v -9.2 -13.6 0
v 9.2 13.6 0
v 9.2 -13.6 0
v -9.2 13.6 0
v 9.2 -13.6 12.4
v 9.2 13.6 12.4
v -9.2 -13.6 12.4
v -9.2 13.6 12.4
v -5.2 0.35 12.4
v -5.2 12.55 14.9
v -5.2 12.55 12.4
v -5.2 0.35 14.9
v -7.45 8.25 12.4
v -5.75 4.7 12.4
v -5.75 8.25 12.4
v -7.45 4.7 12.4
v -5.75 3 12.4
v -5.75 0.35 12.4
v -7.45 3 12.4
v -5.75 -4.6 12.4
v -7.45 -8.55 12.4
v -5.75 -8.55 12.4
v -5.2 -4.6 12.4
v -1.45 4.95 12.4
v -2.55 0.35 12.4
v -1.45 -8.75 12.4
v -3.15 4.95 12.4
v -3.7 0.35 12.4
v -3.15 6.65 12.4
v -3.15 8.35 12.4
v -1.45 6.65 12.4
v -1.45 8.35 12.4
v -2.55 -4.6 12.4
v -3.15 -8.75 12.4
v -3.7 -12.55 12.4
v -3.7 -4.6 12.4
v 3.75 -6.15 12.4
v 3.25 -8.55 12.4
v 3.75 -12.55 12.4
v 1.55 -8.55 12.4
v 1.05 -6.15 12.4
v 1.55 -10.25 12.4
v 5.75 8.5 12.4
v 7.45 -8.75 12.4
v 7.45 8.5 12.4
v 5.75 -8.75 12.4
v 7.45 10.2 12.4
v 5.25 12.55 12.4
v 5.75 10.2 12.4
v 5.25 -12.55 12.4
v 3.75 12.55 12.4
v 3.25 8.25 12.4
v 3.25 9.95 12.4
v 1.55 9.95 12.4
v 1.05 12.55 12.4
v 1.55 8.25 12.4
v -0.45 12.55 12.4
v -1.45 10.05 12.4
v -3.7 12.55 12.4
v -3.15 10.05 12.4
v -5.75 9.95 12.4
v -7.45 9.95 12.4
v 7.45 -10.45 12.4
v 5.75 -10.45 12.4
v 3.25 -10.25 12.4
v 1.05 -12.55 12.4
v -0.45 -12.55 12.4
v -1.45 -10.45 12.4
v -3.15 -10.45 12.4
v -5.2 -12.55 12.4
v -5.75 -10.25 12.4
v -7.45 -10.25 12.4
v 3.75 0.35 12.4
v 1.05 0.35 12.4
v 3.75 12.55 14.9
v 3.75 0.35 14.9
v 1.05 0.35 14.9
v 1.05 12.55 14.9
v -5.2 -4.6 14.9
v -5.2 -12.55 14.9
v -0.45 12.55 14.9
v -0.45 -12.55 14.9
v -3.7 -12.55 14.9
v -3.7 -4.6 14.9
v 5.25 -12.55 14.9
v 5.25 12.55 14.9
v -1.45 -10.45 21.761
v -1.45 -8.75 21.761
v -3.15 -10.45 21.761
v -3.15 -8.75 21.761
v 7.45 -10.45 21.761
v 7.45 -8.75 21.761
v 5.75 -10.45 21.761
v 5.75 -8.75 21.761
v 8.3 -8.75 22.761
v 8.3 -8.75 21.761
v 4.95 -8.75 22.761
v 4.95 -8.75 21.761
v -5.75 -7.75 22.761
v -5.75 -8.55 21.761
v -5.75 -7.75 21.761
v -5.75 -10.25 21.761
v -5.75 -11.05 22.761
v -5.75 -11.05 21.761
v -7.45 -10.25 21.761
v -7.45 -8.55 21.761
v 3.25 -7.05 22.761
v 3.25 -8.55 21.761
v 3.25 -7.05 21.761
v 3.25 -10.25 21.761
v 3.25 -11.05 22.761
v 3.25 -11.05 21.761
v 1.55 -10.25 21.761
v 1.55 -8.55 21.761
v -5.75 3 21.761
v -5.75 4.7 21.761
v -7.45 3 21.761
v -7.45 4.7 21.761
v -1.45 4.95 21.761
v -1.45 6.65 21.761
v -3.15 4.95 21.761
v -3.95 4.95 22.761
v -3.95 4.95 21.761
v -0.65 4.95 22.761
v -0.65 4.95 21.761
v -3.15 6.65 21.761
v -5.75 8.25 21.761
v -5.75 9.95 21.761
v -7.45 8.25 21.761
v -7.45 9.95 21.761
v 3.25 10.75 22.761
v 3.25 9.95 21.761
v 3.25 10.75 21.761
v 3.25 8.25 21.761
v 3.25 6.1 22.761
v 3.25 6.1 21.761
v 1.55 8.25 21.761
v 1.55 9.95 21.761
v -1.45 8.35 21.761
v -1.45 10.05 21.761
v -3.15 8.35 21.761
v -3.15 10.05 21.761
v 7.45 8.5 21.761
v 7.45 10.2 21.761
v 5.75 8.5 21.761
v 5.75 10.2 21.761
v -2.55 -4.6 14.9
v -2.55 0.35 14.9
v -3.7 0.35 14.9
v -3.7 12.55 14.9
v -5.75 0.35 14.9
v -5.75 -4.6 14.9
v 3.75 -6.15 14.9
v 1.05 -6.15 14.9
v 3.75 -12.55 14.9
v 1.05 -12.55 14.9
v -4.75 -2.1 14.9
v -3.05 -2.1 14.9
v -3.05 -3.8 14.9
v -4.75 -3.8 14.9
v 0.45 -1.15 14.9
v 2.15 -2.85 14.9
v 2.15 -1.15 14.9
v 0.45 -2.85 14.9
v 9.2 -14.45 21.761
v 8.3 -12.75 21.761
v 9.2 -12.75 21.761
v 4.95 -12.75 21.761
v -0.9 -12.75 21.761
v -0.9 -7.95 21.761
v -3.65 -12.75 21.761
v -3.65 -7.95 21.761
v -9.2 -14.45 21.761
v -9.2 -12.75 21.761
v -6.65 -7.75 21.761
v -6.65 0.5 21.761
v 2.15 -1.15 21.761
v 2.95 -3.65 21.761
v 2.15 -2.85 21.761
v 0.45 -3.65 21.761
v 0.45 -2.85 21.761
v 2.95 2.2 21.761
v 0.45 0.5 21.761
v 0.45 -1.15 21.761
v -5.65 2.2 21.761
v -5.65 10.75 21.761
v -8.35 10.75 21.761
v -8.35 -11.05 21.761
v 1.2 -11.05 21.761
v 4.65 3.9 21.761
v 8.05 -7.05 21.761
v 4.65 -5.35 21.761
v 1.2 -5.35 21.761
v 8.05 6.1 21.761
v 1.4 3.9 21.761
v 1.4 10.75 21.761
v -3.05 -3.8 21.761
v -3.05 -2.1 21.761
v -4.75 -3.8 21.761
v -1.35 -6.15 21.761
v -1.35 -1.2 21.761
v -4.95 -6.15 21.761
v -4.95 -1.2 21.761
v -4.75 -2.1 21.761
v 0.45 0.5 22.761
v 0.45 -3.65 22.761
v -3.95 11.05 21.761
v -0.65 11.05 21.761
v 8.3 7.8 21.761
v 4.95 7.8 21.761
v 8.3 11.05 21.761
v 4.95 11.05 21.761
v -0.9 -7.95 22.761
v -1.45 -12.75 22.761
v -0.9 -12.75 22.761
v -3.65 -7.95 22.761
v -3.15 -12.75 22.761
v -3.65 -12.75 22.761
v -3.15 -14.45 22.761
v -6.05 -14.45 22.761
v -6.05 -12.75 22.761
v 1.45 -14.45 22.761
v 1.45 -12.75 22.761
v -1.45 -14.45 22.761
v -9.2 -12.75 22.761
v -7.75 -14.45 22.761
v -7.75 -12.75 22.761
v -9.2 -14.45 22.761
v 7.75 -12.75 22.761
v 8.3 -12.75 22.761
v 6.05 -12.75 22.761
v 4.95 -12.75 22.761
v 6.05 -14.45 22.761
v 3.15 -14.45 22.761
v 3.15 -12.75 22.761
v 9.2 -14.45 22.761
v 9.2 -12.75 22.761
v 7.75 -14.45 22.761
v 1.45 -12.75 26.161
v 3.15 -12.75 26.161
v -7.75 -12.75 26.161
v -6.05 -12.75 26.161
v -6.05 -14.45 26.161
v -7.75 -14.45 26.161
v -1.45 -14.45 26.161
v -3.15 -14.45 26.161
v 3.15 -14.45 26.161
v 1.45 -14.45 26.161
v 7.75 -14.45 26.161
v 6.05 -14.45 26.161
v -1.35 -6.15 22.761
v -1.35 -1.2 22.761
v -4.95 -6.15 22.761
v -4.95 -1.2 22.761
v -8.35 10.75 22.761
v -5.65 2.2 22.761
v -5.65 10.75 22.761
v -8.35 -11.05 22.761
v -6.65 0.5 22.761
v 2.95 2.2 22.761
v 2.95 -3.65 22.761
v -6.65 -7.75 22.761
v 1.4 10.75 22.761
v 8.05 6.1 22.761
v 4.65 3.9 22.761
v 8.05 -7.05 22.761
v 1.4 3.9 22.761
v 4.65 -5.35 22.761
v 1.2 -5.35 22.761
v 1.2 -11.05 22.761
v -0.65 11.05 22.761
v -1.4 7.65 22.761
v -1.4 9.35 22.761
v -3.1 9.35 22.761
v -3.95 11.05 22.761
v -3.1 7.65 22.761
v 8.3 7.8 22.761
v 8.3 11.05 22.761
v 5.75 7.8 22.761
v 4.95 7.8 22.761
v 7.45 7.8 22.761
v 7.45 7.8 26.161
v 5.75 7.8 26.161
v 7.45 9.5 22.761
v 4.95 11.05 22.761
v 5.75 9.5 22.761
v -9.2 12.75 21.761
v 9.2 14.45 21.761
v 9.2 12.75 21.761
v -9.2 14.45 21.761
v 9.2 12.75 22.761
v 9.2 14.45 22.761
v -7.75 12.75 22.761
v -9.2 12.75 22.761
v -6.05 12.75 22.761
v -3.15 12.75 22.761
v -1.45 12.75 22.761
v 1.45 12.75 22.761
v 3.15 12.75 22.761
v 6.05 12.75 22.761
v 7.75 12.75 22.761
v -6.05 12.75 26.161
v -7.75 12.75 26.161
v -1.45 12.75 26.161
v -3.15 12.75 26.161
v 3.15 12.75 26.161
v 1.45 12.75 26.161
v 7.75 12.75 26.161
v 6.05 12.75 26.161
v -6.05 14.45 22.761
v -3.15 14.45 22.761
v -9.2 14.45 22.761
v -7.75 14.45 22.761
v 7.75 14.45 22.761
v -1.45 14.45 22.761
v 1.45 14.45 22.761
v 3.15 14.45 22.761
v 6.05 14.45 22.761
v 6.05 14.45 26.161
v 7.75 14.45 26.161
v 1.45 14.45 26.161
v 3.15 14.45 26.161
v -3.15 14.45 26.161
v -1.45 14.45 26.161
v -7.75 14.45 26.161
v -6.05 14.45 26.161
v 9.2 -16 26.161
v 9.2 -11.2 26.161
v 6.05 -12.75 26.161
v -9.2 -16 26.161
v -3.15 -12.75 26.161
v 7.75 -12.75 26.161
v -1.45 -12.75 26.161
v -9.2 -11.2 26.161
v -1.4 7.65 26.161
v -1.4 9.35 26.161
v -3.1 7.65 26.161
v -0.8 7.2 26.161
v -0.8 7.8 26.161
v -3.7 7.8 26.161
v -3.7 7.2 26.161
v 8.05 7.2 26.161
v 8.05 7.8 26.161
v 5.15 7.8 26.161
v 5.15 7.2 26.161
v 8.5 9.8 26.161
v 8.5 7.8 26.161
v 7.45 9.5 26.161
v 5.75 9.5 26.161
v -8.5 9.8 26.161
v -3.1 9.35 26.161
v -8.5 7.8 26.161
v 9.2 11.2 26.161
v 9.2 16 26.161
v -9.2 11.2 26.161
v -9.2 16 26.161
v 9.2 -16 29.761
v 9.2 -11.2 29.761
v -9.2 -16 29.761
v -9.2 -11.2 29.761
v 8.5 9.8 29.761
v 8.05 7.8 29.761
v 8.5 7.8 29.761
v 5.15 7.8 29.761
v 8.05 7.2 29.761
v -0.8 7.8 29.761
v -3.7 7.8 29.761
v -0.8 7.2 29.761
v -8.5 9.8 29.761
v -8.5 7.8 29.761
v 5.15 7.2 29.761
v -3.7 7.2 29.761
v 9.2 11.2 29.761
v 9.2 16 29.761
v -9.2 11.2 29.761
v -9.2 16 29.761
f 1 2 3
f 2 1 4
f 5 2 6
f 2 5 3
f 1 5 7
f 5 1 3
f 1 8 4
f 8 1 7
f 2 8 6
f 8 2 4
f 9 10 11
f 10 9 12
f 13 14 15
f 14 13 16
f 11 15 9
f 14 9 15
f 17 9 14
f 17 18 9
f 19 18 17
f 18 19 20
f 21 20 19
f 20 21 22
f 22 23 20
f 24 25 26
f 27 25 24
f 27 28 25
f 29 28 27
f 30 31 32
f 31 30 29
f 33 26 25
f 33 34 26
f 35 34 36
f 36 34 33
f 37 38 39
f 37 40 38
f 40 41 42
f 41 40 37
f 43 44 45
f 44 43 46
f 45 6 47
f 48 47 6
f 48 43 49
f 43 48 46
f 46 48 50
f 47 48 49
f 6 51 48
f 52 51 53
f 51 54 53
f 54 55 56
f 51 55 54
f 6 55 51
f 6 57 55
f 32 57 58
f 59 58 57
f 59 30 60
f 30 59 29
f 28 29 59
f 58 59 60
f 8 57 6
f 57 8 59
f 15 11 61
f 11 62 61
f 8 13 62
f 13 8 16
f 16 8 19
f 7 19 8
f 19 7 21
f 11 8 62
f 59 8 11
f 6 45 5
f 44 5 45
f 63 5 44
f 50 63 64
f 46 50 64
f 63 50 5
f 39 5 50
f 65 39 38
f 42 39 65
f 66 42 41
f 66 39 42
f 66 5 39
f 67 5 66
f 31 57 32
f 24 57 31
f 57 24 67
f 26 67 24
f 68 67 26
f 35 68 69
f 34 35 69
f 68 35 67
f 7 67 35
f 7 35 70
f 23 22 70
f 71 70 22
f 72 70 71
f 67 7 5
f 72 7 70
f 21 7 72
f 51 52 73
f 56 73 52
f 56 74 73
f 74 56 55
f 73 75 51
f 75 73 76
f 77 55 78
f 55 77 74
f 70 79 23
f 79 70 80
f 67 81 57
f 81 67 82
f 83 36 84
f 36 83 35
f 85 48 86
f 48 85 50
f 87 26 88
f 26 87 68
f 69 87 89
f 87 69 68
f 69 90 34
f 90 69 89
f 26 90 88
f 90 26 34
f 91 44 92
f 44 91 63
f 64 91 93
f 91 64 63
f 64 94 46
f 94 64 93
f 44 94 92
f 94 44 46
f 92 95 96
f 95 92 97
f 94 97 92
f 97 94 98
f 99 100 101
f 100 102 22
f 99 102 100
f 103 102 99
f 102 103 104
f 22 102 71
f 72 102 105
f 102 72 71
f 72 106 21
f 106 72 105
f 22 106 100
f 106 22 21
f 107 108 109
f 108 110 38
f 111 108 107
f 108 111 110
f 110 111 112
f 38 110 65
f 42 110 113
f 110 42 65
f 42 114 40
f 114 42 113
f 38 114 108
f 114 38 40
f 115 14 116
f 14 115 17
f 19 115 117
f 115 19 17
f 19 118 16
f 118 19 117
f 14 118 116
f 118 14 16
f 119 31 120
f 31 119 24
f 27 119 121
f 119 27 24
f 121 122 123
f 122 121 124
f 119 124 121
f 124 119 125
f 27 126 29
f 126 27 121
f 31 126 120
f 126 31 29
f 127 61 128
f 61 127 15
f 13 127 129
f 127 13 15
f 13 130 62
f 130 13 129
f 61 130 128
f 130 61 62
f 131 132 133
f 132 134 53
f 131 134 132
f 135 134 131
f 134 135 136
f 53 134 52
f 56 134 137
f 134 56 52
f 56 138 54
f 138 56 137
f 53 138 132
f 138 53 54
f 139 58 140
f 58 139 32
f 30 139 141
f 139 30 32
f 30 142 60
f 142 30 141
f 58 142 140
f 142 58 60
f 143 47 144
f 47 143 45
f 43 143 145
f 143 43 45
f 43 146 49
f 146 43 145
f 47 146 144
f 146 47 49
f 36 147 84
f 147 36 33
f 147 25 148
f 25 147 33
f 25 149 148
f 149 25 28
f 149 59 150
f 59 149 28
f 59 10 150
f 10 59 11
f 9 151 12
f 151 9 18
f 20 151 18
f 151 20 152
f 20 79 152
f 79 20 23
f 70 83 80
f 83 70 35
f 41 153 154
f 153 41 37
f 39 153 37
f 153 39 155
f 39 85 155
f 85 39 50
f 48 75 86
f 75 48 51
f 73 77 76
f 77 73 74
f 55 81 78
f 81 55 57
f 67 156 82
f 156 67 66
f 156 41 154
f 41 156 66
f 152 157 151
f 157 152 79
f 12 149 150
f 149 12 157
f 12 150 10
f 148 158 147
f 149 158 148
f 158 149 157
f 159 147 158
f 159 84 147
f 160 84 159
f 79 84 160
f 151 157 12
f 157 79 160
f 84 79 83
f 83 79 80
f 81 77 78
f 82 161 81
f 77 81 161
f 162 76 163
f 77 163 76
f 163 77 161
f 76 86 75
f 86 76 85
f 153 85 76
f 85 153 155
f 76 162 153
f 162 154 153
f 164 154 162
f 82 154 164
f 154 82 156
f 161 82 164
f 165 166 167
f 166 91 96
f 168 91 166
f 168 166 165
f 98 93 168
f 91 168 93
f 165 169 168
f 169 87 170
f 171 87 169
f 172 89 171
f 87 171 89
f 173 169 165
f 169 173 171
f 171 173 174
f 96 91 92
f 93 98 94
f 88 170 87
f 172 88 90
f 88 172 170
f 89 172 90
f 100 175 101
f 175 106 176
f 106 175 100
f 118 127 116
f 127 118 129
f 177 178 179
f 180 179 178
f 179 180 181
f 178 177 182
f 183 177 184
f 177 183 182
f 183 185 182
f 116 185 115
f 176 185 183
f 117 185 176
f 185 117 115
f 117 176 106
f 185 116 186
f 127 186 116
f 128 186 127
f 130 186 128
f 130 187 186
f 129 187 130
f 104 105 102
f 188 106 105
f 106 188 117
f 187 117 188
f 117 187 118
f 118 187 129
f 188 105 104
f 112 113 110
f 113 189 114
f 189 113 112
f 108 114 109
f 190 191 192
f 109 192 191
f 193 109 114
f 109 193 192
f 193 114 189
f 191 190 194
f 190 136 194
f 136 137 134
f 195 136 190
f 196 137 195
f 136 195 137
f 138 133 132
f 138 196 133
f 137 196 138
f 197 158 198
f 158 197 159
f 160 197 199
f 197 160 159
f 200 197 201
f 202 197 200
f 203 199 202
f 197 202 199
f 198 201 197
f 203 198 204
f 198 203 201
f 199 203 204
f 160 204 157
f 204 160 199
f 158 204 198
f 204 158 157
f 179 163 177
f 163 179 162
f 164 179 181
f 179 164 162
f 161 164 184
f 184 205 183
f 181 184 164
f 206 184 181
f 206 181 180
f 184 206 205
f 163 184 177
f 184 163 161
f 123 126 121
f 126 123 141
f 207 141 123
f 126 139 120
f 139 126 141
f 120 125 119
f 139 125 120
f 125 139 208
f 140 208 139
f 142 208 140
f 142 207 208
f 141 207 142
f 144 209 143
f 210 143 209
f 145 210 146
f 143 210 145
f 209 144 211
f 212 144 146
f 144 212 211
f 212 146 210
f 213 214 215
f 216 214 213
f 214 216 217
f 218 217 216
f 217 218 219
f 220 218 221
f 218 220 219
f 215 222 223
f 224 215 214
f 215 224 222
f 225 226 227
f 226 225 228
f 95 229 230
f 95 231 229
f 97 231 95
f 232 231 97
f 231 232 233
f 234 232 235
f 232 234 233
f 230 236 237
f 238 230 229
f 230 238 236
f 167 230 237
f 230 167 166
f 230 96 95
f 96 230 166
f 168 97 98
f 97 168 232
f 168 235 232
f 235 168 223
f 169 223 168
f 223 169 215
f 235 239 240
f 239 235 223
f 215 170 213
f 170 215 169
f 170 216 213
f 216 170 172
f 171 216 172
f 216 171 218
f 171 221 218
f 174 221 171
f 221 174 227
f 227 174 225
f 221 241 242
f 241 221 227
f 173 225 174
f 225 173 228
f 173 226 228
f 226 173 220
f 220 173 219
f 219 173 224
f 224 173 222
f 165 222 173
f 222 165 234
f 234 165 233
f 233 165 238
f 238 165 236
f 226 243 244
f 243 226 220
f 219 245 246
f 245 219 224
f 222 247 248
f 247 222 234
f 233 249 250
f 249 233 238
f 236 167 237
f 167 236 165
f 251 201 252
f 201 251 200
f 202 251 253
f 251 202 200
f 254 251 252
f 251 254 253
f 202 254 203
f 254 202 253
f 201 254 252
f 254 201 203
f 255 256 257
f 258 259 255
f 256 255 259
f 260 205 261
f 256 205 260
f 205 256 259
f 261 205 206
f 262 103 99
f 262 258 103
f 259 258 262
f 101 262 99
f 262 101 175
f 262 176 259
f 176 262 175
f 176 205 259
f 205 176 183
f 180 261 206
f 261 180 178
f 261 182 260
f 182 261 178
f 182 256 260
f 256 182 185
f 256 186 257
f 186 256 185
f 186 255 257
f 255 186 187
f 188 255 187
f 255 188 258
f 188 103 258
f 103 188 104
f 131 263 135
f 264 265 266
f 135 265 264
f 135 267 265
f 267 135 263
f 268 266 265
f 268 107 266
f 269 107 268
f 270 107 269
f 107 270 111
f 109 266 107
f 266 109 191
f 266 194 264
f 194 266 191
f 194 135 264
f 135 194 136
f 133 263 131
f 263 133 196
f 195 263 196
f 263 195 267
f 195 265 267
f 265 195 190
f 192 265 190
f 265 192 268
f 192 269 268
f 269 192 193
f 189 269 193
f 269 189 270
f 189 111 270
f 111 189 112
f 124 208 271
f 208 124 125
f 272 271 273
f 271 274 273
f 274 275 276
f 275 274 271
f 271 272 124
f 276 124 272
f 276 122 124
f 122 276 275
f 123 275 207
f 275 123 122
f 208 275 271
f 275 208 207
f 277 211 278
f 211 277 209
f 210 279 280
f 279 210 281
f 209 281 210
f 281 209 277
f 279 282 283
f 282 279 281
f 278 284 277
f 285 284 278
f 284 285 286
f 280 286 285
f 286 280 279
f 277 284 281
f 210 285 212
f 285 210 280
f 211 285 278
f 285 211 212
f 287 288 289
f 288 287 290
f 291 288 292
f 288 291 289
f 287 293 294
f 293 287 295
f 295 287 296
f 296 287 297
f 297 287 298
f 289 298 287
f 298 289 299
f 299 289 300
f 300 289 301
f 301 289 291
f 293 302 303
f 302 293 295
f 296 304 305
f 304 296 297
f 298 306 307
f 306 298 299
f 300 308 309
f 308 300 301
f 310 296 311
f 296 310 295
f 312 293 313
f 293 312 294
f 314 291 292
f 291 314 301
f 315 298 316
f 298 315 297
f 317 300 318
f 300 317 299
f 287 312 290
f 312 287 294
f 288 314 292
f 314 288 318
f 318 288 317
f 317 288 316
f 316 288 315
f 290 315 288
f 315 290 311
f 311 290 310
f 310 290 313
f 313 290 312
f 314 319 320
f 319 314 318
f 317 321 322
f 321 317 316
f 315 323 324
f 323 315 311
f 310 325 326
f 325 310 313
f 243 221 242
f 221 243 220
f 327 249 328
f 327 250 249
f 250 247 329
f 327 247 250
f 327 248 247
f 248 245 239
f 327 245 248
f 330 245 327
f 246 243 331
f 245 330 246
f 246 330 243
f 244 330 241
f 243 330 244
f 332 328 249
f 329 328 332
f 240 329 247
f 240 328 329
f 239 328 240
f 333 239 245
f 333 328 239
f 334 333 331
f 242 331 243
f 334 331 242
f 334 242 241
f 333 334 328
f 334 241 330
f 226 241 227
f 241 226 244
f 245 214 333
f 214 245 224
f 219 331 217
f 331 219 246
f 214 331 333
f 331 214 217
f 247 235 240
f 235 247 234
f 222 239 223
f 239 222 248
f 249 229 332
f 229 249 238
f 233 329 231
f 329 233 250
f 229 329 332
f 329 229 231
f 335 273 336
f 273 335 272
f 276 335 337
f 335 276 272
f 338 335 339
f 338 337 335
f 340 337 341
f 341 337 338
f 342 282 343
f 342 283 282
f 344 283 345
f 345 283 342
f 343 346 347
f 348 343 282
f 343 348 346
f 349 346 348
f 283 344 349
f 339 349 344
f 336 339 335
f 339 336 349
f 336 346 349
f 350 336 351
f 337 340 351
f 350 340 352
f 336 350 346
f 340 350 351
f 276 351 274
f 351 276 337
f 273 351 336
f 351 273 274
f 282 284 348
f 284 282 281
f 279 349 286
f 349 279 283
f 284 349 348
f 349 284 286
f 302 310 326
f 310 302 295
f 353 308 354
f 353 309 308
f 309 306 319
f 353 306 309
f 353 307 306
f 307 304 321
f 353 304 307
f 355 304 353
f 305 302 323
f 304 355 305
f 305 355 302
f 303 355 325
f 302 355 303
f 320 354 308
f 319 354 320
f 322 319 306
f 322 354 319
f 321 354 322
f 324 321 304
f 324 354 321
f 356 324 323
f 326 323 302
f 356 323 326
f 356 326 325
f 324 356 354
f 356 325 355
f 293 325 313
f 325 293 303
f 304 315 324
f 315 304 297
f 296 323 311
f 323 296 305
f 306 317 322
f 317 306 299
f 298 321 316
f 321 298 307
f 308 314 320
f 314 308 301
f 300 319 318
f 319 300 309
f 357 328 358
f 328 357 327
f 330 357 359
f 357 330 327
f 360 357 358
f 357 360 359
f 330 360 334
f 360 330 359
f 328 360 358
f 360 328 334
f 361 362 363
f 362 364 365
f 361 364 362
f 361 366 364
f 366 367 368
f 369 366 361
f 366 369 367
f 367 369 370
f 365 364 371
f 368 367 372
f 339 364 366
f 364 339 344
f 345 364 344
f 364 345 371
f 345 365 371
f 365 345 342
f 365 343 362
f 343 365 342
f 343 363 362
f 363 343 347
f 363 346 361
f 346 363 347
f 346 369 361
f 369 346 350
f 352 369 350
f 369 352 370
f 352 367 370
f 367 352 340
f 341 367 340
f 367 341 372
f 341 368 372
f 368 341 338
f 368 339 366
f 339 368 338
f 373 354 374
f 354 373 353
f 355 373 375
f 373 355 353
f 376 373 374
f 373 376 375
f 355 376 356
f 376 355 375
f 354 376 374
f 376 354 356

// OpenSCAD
// Generated by SolidPython 0.4.2 on 2020-09-29 23:21:01
//!OpenSCAD

scale(v = 0.0100000000) {
	translate(v = [-920, -1360, 0]) {
		union() {
			color(c = [0.4000000000, 0.4000000000, 0.4000000000]) {
				translate(v = [0, 0, 0]) {
					linear_extrude(height = 1000.0000000000) {
						polygon(paths = [[0, 1, 2, 3]], points = [[0, 0], [0, 2720], [1840, 2720], [1840, 0]]);
					}
				}
			}
			color(c = [0.2000000000, 0.6000000000, 0.2000000000]) {
				translate(v = [0, 0, 1000.0000000000]) {
					linear_extrude(height = 120.0000000000) {
						polygon(paths = [[0, 1, 2, 3]], points = [[0, 1305], [0, 2720], [1840, 2720], [1840, 1305]]);
					}
				}
			}
			color(c = [0.4000000000, 0.4000000000, 0.4000000000]) {
				translate(v = [0, 0, 1000.0000000000]) {
					linear_extrude(height = 120.0000000000) {
						polygon(paths = [[0, 1, 2, 3]], points = [[0, 0], [0, 1305], [1840, 1305], [1840, 0]]);
					}
				}
			}
			color(c = [0.9000000000, 0.6000000000, 0.6000000000]) {
				translate(v = [0, 0, 1120.0000000000]) {
					linear_extrude(height = 120.0000000000) {
						polygon(paths = [[0, 1, 2, 3]], points = [[135, 1485], [135, 2485], [400, 2485], [400, 1485]]);
					}
				}
			}
			color(c = [0.9000000000, 0.6000000000, 0.6000000000]) {
				translate(v = [0, 0, 1120.0000000000]) {
					linear_extrude(height = 120.0000000000) {
						polygon(paths = [[0, 1, 2, 3]], points = [[550, 1485], [550, 2485], [875, 2485], [875, 1485]]);
					}
				}
			}
			color(c = [0.9000000000, 0.6000000000, 0.6000000000]) {
				translate(v = [0, 0, 1120.0000000000]) {
					linear_extrude(height = 120.0000000000) {
						polygon(paths = [[0, 1, 2, 3]], points = [[1025, 1485], [1025, 2485], [1295, 2485], [1295, 1485]]);
					}
				}
			}
			color(c = [0.9000000000, 0.6000000000, 0.6000000000]) {
				translate(v = [0, 0, 1120.0000000000]) {
					linear_extrude(height = 120.0000000000) {
						polygon(paths = [[0, 1, 2, 3]], points = [[1445, 1485], [1445, 2485], [1705, 2485], [1705, 1485]]);
					}
				}
			}
			color(c = [0.9000000000, 0.6000000000, 0.9000000000]) {
				translate(v = [0, 0, 1120.0000000000]) {
					linear_extrude(height = 120.0000000000) {
						polygon(paths = [[0, 1, 2, 3]], points = [[135, 235], [135, 655], [400, 655], [400, 235]]);
					}
				}
			}
			color(c = [0.9000000000, 0.6000000000, 0.9000000000]) {
				translate(v = [0, 0, 1120.0000000000]) {
					linear_extrude(height = 120.0000000000) {
						polygon(paths = [[0, 1, 2, 3]], points = [[550, 235], [550, 655], [875, 655], [875, 235]]);
					}
				}
			}
			color(c = [0.9000000000, 0.6000000000, 0.9000000000]) {
				translate(v = [0, 0, 1120.0000000000]) {
					linear_extrude(height = 120.0000000000) {
						polygon(paths = [[0, 1, 2, 3]], points = [[1025, 235], [1025, 655], [1295, 655], [1295, 235]]);
					}
				}
			}
			color(c = [0.9000000000, 0.6000000000, 0.9000000000]) {
				translate(v = [0, 0, 1120.0000000000]) {
					linear_extrude(height = 120.0000000000) {
						polygon(paths = [[0, 1, 2, 3]], points = [[1445, 235], [1445, 655], [1705, 655], [1705, 235]]);
					}
				}
			}
			color(c = [0.2000000000, 0.6000000000, 0.2000000000]) {
				translate(v = [0, 0, 1120.0000000000]) {
					linear_extrude(height = 120.0000000000) {
						difference() {
							polygon(paths = [[0, 1, 2, 3]], points = [[0, 1305], [0, 2720], [1840, 2720], [1840, 1305]]);
							polygon(paths = [[0, 1, 2, 3]], points = [[135, 1485], [400, 1485], [400, 2485], [135, 2485]]);
							polygon(paths = [[0, 1, 2, 3]], points = [[550, 1485], [875, 1485], [875, 2485], [550, 2485]]);
							polygon(paths = [[0, 1, 2, 3]], points = [[1025, 1485], [1295, 1485], [1295, 2485], [1025, 2485]]);
							polygon(paths = [[0, 1, 2, 3]], points = [[1445, 1485], [1705, 1485], [1705, 2485], [1445, 2485]]);
						}
					}
				}
			}
			color(c = [0.4000000000, 0.4000000000, 0.4000000000]) {
				translate(v = [0, 0, 1120.0000000000]) {
					linear_extrude(height = 120.0000000000) {
						difference() {
							polygon(paths = [[0, 1, 2, 3]], points = [[0, 0], [0, 1305], [1840, 1305], [1840, 0]]);
							polygon(paths = [[0, 1, 2, 3]], points = [[135, 235], [400, 235], [400, 655], [135, 655]]);
							polygon(paths = [[0, 1, 2, 3]], points = [[550, 235], [875, 235], [875, 655], [550, 655]]);
							polygon(paths = [[0, 1, 2, 3]], points = [[1025, 235], [1295, 235], [1295, 655], [1025, 655]]);
							polygon(paths = [[0, 1, 2, 3]], points = [[1445, 235], [1705, 235], [1705, 655], [1445, 655]]);
						}
					}
				}
			}
			color(c = [0.1000000000, 0.1000000000, 0.1000000000]) {
				translate(v = [0, 0, 1240.0000000000]) {
					linear_extrude(height = 70.0000000000) {
						polygon(paths = [[0, 1, 2, 3]], points = [[605, 315], [605, 485], [775, 485], [775, 315]]);
					}
				}
			}
			color(c = [0.1000000000, 0.1000000000, 0.1000000000]) {
				translate(v = [0, 0, 1240.0000000000]) {
					linear_extrude(height = 70.0000000000) {
						polygon(paths = [[0, 1, 2, 3]], points = [[1495, 315], [1495, 485], [1665, 485], [1665, 315]]);
					}
				}
			}
			color(c = [0.1000000000, 0.1000000000, 0.1000000000]) {
				translate(v = [0, 0, 1240.0000000000]) {
					linear_extrude(height = 70.0000000000) {
						polygon(paths = [[0, 1, 2, 3]], points = [[175, 335], [175, 505], [345, 505], [345, 335]]);
					}
				}
			}
			color(c = [0.1000000000, 0.1000000000, 0.1000000000]) {
				translate(v = [0, 0, 1240.0000000000]) {
					linear_extrude(height = 70.0000000000) {
						polygon(paths = [[0, 1, 2, 3]], points = [[1075, 335], [1075, 505], [1245, 505], [1245, 335]]);
					}
				}
			}
			color(c = [0.1000000000, 0.1000000000, 0.1000000000]) {
				translate(v = [0, 0, 1240.0000000000]) {
					linear_extrude(height = 70.0000000000) {
						polygon(paths = [[0, 1, 2, 3]], points = [[175, 1660], [175, 1830], [345, 1830], [345, 1660]]);
					}
				}
			}
			color(c = [0.1000000000, 0.1000000000, 0.1000000000]) {
				translate(v = [0, 0, 1240.0000000000]) {
					linear_extrude(height = 70.0000000000) {
						polygon(paths = [[0, 1, 2, 3]], points = [[605, 1855], [605, 2025], [775, 2025], [775, 1855]]);
					}
				}
			}
			color(c = [0.1000000000, 0.1000000000, 0.1000000000]) {
				translate(v = [0, 0, 1240.0000000000]) {
					linear_extrude(height = 70.0000000000) {
						polygon(paths = [[0, 1, 2, 3]], points = [[175, 2185], [175, 2355], [345, 2355], [345, 2185]]);
					}
				}
			}
			color(c = [0.1000000000, 0.1000000000, 0.1000000000]) {
				translate(v = [0, 0, 1240.0000000000]) {
					linear_extrude(height = 70.0000000000) {
						polygon(paths = [[0, 1, 2, 3]], points = [[1075, 2185], [1075, 2355], [1245, 2355], [1245, 2185]]);
					}
				}
			}
			color(c = [0.1000000000, 0.1000000000, 0.1000000000]) {
				translate(v = [0, 0, 1240.0000000000]) {
					linear_extrude(height = 70.0000000000) {
						polygon(paths = [[0, 1, 2, 3]], points = [[605, 2195], [605, 2365], [775, 2365], [775, 2195]]);
					}
				}
			}
			color(c = [0.1000000000, 0.1000000000, 0.1000000000]) {
				translate(v = [0, 0, 1240.0000000000]) {
					linear_extrude(height = 70.0000000000) {
						polygon(paths = [[0, 1, 2, 3]], points = [[1495, 2210], [1495, 2380], [1665, 2380], [1665, 2210]]);
					}
				}
			}
			color(c = [1.0000000000, 1.0000000000, 1.0000000000]) {
				translate(v = [0, 0, 1240.0000000000]) {
					linear_extrude(height = 70.0000000000) {
						polygon(paths = [[0, 1, 2, 3, 4, 5, 6, 7, 8, 9, 10, 11]], points = [[400, 105], [400, 900], [345, 900], [345, 1395], [400, 1395], [400, 2615], [550, 2615], [550, 1395], [665, 1395], [665, 900], [550, 900], [550, 105]]);
					}
				}
			}
			color(c = [1.0000000000, 1.0000000000, 1.0000000000]) {
				translate(v = [0, 0, 1240.0000000000]) {
					linear_extrude(height = 70.0000000000) {
						polygon(paths = [[0, 1, 2, 3, 4, 5, 6, 7, 8, 9, 10, 11]], points = [[875, 105], [875, 2615], [1025, 2615], [1025, 1395], [1295, 1395], [1295, 2615], [1445, 2615], [1445, 105], [1295, 105], [1295, 745], [1025, 745], [1025, 105]]);
					}
				}
			}
			color(c = [0.1000000000, 0.1000000000, 0.1000000000]) {
				translate(v = [0, 0, 1310.0000000000]) {
					linear_extrude(height = 180.0000000000) {
						polygon(paths = [[0, 1, 2, 3]], points = [[605, 315], [605, 485], [775, 485], [775, 315]]);
					}
				}
			}
			color(c = [0.1000000000, 0.1000000000, 0.1000000000]) {
				translate(v = [0, 0, 1310.0000000000]) {
					linear_extrude(height = 180.0000000000) {
						polygon(paths = [[0, 1, 2, 3]], points = [[1495, 315], [1495, 485], [1665, 485], [1665, 315]]);
					}
				}
			}
			color(c = [0.1000000000, 0.1000000000, 0.1000000000]) {
				translate(v = [0, 0, 1310.0000000000]) {
					linear_extrude(height = 180.0000000000) {
						polygon(paths = [[0, 1, 2, 3]], points = [[175, 335], [175, 505], [345, 505], [345, 335]]);
					}
				}
			}
			color(c = [0.1000000000, 0.1000000000, 0.1000000000]) {
				translate(v = [0, 0, 1310.0000000000]) {
					linear_extrude(height = 180.0000000000) {
						polygon(paths = [[0, 1, 2, 3]], points = [[1075, 335], [1075, 505], [1245, 505], [1245, 335]]);
					}
				}
			}
			color(c = [0.1000000000, 0.1000000000, 0.1000000000]) {
				translate(v = [0, 0, 1310.0000000000]) {
					linear_extrude(height = 180.0000000000) {
						polygon(paths = [[0, 1, 2, 3]], points = [[175, 1660], [175, 1830], [345, 1830], [345, 1660]]);
					}
				}
			}
			color(c = [0.1000000000, 0.1000000000, 0.1000000000]) {
				translate(v = [0, 0, 1310.0000000000]) {
					linear_extrude(height = 180.0000000000) {
						polygon(paths = [[0, 1, 2, 3]], points = [[605, 1855], [605, 2025], [775, 2025], [775, 1855]]);
					}
				}
			}
			color(c = [0.1000000000, 0.1000000000, 0.1000000000]) {
				translate(v = [0, 0, 1310.0000000000]) {
					linear_extrude(height = 180.0000000000) {
						polygon(paths = [[0, 1, 2, 3]], points = [[175, 2185], [175, 2355], [345, 2355], [345, 2185]]);
					}
				}
			}
			color(c = [0.1000000000, 0.1000000000, 0.1000000000]) {
				translate(v = [0, 0, 1310.0000000000]) {
					linear_extrude(height = 180.0000000000) {
						polygon(paths = [[0, 1, 2, 3]], points = [[1075, 2185], [1075, 2355], [1245, 2355], [1245, 2185]]);
					}
				}
			}
			color(c = [0.1000000000, 0.1000000000, 0.1000000000]) {
				translate(v = [0, 0, 1310.0000000000]) {
					linear_extrude(height = 180.0000000000) {
						polygon(paths = [[0, 1, 2, 3]], points = [[605, 2195], [605, 2365], [775, 2365], [775, 2195]]);
					}
				}
			}
			color(c = [0.1000000000, 0.1000000000, 0.1000000000]) {
				translate(v = [0, 0, 1310.0000000000]) {
					linear_extrude(height = 180.0000000000) {
						polygon(paths = [[0, 1, 2, 3]], points = [[1495, 2210], [1495, 2380], [1665, 2380], [1665, 2210]]);
					}
				}
			}
			color(c = [0.7000000000, 0, 0]) {
				translate(v = [0, 0, 1310.0000000000]) {
					linear_extrude(height = 180.0000000000) {
						polygon(paths = [[0, 1, 2, 3, 4, 5, 6, 7, 8, 9, 10, 11]], points = [[400, 105], [400, 900], [345, 900], [345, 1395], [400, 1395], [400, 2615], [550, 2615], [550, 1395], [665, 1395], [665, 900], [550, 900], [550, 105]]);
					}
				}
			}
			color(c = [0.7000000000, 0, 0]) {
				translate(v = [0, 0, 1310.0000000000]) {
					linear_extrude(height = 180.0000000000) {
						polygon(paths = [[0, 1, 2, 3, 4, 5, 6, 7, 8, 9, 10, 11]], points = [[875, 105], [875, 2615], [1025, 2615], [1025, 1395], [1295, 1395], [1295, 2615], [1445, 2615], [1445, 105], [1295, 105], [1295, 745], [1025, 745], [1025, 105]]);
					}
				}
			}
			color(c = [0.1000000000, 0.1000000000, 0.1000000000]) {
				translate(v = [0, 0, 1490.0000000000]) {
					linear_extrude(height = 686.1000000000) {
						polygon(paths = [[0, 1, 2, 3]], points = [[605, 315], [605, 485], [775, 485], [775, 315]]);
					}
				}
			}
			color(c = [0.1000000000, 0.1000000000, 0.1000000000]) {
				translate(v = [0, 0, 1490.0000000000]) {
					linear_extrude(height = 686.1000000000) {
						polygon(paths = [[0, 1, 2, 3]], points = [[1495, 315], [1495, 485], [1665, 485], [1665, 315]]);
					}
				}
			}
			color(c = [0.1000000000, 0.1000000000, 0.1000000000]) {
				translate(v = [0, 0, 1490.0000000000]) {
					linear_extrude(height = 686.1000000000) {
						polygon(paths = [[0, 1, 2, 3]], points = [[175, 335], [175, 505], [345, 505], [345, 335]]);
					}
				}
			}
			color(c = [0.1000000000, 0.1000000000, 0.1000000000]) {
				translate(v = [0, 0, 1490.0000000000]) {
					linear_extrude(height = 686.1000000000) {
						polygon(paths = [[0, 1, 2, 3]], points = [[1075, 335], [1075, 505], [1245, 505], [1245, 335]]);
					}
				}
			}
			color(c = [0.1000000000, 0.1000000000, 0.1000000000]) {
				translate(v = [0, 0, 1490.0000000000]) {
					linear_extrude(height = 686.1000000000) {
						polygon(paths = [[0, 1, 2, 3]], points = [[445, 980], [445, 1150], [615, 1150], [615, 980]]);
					}
				}
			}
			color(c = [0.1000000000, 0.1000000000, 0.1000000000]) {
				translate(v = [0, 0, 1490.0000000000]) {
					linear_extrude(height = 686.1000000000) {
						polygon(paths = [[0, 1, 2, 3]], points = [[965, 1075], [965, 1245], [1135, 1245], [1135, 1075]]);
					}
				}
			}
			color(c = [0.1000000000, 0.1000000000, 0.1000000000]) {
				translate(v = [0, 0, 1490.0000000000]) {
					linear_extrude(height = 686.1000000000) {
						polygon(paths = [[0, 1, 2, 3]], points = [[175, 1660], [175, 1830], [345, 1830], [345, 1660]]);
					}
				}
			}
			color(c = [0.1000000000, 0.1000000000, 0.1000000000]) {
				translate(v = [0, 0, 1490.0000000000]) {
					linear_extrude(height = 686.1000000000) {
						polygon(paths = [[0, 1, 2, 3]], points = [[605, 1855], [605, 2025], [775, 2025], [775, 1855]]);
					}
				}
			}
			color(c = [0.1000000000, 0.1000000000, 0.1000000000]) {
				translate(v = [0, 0, 1490.0000000000]) {
					linear_extrude(height = 686.1000000000) {
						polygon(paths = [[0, 1, 2, 3]], points = [[175, 2185], [175, 2355], [345, 2355], [345, 2185]]);
					}
				}
			}
			color(c = [0.1000000000, 0.1000000000, 0.1000000000]) {
				translate(v = [0, 0, 1490.0000000000]) {
					linear_extrude(height = 686.1000000000) {
						polygon(paths = [[0, 1, 2, 3]], points = [[1075, 2185], [1075, 2355], [1245, 2355], [1245, 2185]]);
					}
				}
			}
			color(c = [0.1000000000, 0.1000000000, 0.1000000000]) {
				translate(v = [0, 0, 1490.0000000000]) {
					linear_extrude(height = 686.1000000000) {
						polygon(paths = [[0, 1, 2, 3]], points = [[605, 2195], [605, 2365], [775, 2365], [775, 2195]]);
					}
				}
			}
			color(c = [0.1000000000, 0.1000000000, 0.1000000000]) {
				translate(v = [0, 0, 1490.0000000000]) {
					linear_extrude(height = 686.1000000000) {
						polygon(paths = [[0, 1, 2, 3]], points = [[1495, 2210], [1495, 2380], [1665, 2380], [1665, 2210]]);
					}
				}
			}
			color(c = [0.9000000000, 0.6000000000, 0.6000000000]) {
				translate(v = [0, 0, 2176.1000000000]) {
					linear_extrude(height = 100.0000000000) {
						polygon(paths = [[0, 1, 2, 3, 4, 5, 6, 7, 8, 9, 10, 11]], points = [[0, -85], [0, 85], [555, 85], [555, 565], [830, 565], [830, 85], [1415, 85], [1415, 485], [1750, 485], [1750, 85], [1840, 85], [1840, -85]]);
					}
				}
			}
			color(c = [0.9000000000, 0.6000000000, 0.6000000000]) {
				translate(v = [0, 0, 2176.1000000000]) {
					linear_extrude(height = 100.0000000000) {
						polygon(paths = [[0, 1, 2, 3]], points = [[425, 745], [425, 1240], [785, 1240], [785, 745]]);
					}
				}
			}
			color(c = [0.9000000000, 0.6000000000, 0.6000000000]) {
				translate(v = [0, 0, 2176.1000000000]) {
					linear_extrude(height = 100.0000000000) {
						polygon(paths = [[0, 1, 2, 3, 4, 5, 6, 7, 8, 9, 10, 11]], points = [[85, 255], [85, 2435], [355, 2435], [355, 1580], [1215, 1580], [1215, 995], [965, 995], [965, 1410], [255, 1410], [255, 585], [345, 585], [345, 255]]);
					}
				}
			}
			color(c = [0.9000000000, 0.6000000000, 0.6000000000]) {
				translate(v = [0, 0, 2176.1000000000]) {
					linear_extrude(height = 100.0000000000) {
						polygon(paths = [[0, 1, 2, 3, 4, 5, 6, 7, 8, 9, 10, 11]], points = [[1040, 255], [1040, 825], [1385, 825], [1385, 1750], [1060, 1750], [1060, 2435], [1245, 2435], [1245, 1970], [1725, 1970], [1725, 655], [1245, 655], [1245, 255]]);
					}
				}
			}
			color(c = [0.9000000000, 0.6000000000, 0.6000000000]) {
				translate(v = [0, 0, 2176.1000000000]) {
					linear_extrude(height = 100.0000000000) {
						polygon(paths = [[0, 1, 2, 3]], points = [[525, 1855], [525, 2465], [855, 2465], [855, 1855]]);
					}
				}
			}
			color(c = [0.9000000000, 0.6000000000, 0.6000000000]) {
				translate(v = [0, 0, 2176.1000000000]) {
					linear_extrude(height = 100.0000000000) {
						polygon(paths = [[0, 1, 2, 3]], points = [[1415, 2140], [1415, 2465], [1750, 2465], [1750, 2140]]);
					}
				}
			}
			color(c = [0.9000000000, 0.6000000000, 0.6000000000]) {
				translate(v = [0, 0, 2176.1000000000]) {
					linear_extrude(height = 100.0000000000) {
						polygon(paths = [[0, 1, 2, 3]], points = [[0, 2635], [0, 2805], [1840, 2805], [1840, 2635]]);
					}
				}
			}
			color(c = [0.5000000000, 0.5000000000, 0.5000000000]) {
				translate(v = [0, 0, 2276.1000000000]) {
					linear_extrude(height = 340.0000000000) {
						polygon(paths = [[0, 1, 2, 3]], points = [[145, -85], [145, 85], [315, 85], [315, -85]]);
					}
				}
			}
			color(c = [0.5000000000, 0.5000000000, 0.5000000000]) {
				translate(v = [0, 0, 2276.1000000000]) {
					linear_extrude(height = 340.0000000000) {
						polygon(paths = [[0, 1, 2, 3]], points = [[605, -85], [605, 85], [775, 85], [775, -85]]);
					}
				}
			}
			color(c = [0.5000000000, 0.5000000000, 0.5000000000]) {
				translate(v = [0, 0, 2276.1000000000]) {
					linear_extrude(height = 340.0000000000) {
						polygon(paths = [[0, 1, 2, 3]], points = [[1065, -85], [1065, 85], [1235, 85], [1235, -85]]);
					}
				}
			}
			color(c = [0.5000000000, 0.5000000000, 0.5000000000]) {
				translate(v = [0, 0, 2276.1000000000]) {
					linear_extrude(height = 340.0000000000) {
						polygon(paths = [[0, 1, 2, 3]], points = [[1525, -85], [1525, 85], [1695, 85], [1695, -85]]);
					}
				}
			}
			color(c = [0.5000000000, 0.5000000000, 0.5000000000]) {
				translate(v = [0, 0, 2276.1000000000]) {
					linear_extrude(height = 340.0000000000) {
						polygon(paths = [[0, 1, 2, 3]], points = [[610, 2125], [610, 2295], [780, 2295], [780, 2125]]);
					}
				}
			}
			color(c = [0.5000000000, 0.5000000000, 0.5000000000]) {
				translate(v = [0, 0, 2276.1000000000]) {
					linear_extrude(height = 340.0000000000) {
						polygon(paths = [[0, 1, 2, 3]], points = [[1495, 2140], [1495, 2310], [1665, 2310], [1665, 2140]]);
					}
				}
			}
			color(c = [0.5000000000, 0.5000000000, 0.5000000000]) {
				translate(v = [0, 0, 2276.1000000000]) {
					linear_extrude(height = 340.0000000000) {
						polygon(paths = [[0, 1, 2, 3]], points = [[145, 2635], [145, 2805], [315, 2805], [315, 2635]]);
					}
				}
			}
			color(c = [0.5000000000, 0.5000000000, 0.5000000000]) {
				translate(v = [0, 0, 2276.1000000000]) {
					linear_extrude(height = 340.0000000000) {
						polygon(paths = [[0, 1, 2, 3]], points = [[605, 2635], [605, 2805], [775, 2805], [775, 2635]]);
					}
				}
			}
			color(c = [0.5000000000, 0.5000000000, 0.5000000000]) {
				translate(v = [0, 0, 2276.1000000000]) {
					linear_extrude(height = 340.0000000000) {
						polygon(paths = [[0, 1, 2, 3]], points = [[1065, 2635], [1065, 2805], [1235, 2805], [1235, 2635]]);
					}
				}
			}
			color(c = [0.5000000000, 0.5000000000, 0.5000000000]) {
				translate(v = [0, 0, 2276.1000000000]) {
					linear_extrude(height = 340.0000000000) {
						polygon(paths = [[0, 1, 2, 3]], points = [[1525, 2635], [1525, 2805], [1695, 2805], [1695, 2635]]);
					}
				}
			}
			color(c = [0.3000000000, 0.3000000000, 1]) {
				translate(v = [0, 0, 2616.1000000000]) {
					linear_extrude(height = 360.0000000000) {
						polygon(paths = [[0, 1, 2, 3]], points = [[0, -240], [0, 240], [1840, 240], [1840, -240]]);
					}
				}
			}
			color(c = [0.3000000000, 0.3000000000, 1]) {
				translate(v = [0, 0, 2616.1000000000]) {
					linear_extrude(height = 360.0000000000) {
						polygon(paths = [[0, 1, 2, 3, 4, 5, 6, 7, 8, 9, 10, 11]], points = [[550, 2080], [550, 2140], [70, 2140], [70, 2340], [1770, 2340], [1770, 2140], [1725, 2140], [1725, 2080], [1435, 2080], [1435, 2140], [840, 2140], [840, 2080]]);
					}
				}
			}
			color(c = [0.3000000000, 0.3000000000, 1]) {
				translate(v = [0, 0, 2616.1000000000]) {
					linear_extrude(height = 360.0000000000) {
						polygon(paths = [[0, 1, 2, 3]], points = [[0, 2480], [0, 2960], [1840, 2960], [1840, 2480]]);
					}
				}
			}
		}
	}
}
